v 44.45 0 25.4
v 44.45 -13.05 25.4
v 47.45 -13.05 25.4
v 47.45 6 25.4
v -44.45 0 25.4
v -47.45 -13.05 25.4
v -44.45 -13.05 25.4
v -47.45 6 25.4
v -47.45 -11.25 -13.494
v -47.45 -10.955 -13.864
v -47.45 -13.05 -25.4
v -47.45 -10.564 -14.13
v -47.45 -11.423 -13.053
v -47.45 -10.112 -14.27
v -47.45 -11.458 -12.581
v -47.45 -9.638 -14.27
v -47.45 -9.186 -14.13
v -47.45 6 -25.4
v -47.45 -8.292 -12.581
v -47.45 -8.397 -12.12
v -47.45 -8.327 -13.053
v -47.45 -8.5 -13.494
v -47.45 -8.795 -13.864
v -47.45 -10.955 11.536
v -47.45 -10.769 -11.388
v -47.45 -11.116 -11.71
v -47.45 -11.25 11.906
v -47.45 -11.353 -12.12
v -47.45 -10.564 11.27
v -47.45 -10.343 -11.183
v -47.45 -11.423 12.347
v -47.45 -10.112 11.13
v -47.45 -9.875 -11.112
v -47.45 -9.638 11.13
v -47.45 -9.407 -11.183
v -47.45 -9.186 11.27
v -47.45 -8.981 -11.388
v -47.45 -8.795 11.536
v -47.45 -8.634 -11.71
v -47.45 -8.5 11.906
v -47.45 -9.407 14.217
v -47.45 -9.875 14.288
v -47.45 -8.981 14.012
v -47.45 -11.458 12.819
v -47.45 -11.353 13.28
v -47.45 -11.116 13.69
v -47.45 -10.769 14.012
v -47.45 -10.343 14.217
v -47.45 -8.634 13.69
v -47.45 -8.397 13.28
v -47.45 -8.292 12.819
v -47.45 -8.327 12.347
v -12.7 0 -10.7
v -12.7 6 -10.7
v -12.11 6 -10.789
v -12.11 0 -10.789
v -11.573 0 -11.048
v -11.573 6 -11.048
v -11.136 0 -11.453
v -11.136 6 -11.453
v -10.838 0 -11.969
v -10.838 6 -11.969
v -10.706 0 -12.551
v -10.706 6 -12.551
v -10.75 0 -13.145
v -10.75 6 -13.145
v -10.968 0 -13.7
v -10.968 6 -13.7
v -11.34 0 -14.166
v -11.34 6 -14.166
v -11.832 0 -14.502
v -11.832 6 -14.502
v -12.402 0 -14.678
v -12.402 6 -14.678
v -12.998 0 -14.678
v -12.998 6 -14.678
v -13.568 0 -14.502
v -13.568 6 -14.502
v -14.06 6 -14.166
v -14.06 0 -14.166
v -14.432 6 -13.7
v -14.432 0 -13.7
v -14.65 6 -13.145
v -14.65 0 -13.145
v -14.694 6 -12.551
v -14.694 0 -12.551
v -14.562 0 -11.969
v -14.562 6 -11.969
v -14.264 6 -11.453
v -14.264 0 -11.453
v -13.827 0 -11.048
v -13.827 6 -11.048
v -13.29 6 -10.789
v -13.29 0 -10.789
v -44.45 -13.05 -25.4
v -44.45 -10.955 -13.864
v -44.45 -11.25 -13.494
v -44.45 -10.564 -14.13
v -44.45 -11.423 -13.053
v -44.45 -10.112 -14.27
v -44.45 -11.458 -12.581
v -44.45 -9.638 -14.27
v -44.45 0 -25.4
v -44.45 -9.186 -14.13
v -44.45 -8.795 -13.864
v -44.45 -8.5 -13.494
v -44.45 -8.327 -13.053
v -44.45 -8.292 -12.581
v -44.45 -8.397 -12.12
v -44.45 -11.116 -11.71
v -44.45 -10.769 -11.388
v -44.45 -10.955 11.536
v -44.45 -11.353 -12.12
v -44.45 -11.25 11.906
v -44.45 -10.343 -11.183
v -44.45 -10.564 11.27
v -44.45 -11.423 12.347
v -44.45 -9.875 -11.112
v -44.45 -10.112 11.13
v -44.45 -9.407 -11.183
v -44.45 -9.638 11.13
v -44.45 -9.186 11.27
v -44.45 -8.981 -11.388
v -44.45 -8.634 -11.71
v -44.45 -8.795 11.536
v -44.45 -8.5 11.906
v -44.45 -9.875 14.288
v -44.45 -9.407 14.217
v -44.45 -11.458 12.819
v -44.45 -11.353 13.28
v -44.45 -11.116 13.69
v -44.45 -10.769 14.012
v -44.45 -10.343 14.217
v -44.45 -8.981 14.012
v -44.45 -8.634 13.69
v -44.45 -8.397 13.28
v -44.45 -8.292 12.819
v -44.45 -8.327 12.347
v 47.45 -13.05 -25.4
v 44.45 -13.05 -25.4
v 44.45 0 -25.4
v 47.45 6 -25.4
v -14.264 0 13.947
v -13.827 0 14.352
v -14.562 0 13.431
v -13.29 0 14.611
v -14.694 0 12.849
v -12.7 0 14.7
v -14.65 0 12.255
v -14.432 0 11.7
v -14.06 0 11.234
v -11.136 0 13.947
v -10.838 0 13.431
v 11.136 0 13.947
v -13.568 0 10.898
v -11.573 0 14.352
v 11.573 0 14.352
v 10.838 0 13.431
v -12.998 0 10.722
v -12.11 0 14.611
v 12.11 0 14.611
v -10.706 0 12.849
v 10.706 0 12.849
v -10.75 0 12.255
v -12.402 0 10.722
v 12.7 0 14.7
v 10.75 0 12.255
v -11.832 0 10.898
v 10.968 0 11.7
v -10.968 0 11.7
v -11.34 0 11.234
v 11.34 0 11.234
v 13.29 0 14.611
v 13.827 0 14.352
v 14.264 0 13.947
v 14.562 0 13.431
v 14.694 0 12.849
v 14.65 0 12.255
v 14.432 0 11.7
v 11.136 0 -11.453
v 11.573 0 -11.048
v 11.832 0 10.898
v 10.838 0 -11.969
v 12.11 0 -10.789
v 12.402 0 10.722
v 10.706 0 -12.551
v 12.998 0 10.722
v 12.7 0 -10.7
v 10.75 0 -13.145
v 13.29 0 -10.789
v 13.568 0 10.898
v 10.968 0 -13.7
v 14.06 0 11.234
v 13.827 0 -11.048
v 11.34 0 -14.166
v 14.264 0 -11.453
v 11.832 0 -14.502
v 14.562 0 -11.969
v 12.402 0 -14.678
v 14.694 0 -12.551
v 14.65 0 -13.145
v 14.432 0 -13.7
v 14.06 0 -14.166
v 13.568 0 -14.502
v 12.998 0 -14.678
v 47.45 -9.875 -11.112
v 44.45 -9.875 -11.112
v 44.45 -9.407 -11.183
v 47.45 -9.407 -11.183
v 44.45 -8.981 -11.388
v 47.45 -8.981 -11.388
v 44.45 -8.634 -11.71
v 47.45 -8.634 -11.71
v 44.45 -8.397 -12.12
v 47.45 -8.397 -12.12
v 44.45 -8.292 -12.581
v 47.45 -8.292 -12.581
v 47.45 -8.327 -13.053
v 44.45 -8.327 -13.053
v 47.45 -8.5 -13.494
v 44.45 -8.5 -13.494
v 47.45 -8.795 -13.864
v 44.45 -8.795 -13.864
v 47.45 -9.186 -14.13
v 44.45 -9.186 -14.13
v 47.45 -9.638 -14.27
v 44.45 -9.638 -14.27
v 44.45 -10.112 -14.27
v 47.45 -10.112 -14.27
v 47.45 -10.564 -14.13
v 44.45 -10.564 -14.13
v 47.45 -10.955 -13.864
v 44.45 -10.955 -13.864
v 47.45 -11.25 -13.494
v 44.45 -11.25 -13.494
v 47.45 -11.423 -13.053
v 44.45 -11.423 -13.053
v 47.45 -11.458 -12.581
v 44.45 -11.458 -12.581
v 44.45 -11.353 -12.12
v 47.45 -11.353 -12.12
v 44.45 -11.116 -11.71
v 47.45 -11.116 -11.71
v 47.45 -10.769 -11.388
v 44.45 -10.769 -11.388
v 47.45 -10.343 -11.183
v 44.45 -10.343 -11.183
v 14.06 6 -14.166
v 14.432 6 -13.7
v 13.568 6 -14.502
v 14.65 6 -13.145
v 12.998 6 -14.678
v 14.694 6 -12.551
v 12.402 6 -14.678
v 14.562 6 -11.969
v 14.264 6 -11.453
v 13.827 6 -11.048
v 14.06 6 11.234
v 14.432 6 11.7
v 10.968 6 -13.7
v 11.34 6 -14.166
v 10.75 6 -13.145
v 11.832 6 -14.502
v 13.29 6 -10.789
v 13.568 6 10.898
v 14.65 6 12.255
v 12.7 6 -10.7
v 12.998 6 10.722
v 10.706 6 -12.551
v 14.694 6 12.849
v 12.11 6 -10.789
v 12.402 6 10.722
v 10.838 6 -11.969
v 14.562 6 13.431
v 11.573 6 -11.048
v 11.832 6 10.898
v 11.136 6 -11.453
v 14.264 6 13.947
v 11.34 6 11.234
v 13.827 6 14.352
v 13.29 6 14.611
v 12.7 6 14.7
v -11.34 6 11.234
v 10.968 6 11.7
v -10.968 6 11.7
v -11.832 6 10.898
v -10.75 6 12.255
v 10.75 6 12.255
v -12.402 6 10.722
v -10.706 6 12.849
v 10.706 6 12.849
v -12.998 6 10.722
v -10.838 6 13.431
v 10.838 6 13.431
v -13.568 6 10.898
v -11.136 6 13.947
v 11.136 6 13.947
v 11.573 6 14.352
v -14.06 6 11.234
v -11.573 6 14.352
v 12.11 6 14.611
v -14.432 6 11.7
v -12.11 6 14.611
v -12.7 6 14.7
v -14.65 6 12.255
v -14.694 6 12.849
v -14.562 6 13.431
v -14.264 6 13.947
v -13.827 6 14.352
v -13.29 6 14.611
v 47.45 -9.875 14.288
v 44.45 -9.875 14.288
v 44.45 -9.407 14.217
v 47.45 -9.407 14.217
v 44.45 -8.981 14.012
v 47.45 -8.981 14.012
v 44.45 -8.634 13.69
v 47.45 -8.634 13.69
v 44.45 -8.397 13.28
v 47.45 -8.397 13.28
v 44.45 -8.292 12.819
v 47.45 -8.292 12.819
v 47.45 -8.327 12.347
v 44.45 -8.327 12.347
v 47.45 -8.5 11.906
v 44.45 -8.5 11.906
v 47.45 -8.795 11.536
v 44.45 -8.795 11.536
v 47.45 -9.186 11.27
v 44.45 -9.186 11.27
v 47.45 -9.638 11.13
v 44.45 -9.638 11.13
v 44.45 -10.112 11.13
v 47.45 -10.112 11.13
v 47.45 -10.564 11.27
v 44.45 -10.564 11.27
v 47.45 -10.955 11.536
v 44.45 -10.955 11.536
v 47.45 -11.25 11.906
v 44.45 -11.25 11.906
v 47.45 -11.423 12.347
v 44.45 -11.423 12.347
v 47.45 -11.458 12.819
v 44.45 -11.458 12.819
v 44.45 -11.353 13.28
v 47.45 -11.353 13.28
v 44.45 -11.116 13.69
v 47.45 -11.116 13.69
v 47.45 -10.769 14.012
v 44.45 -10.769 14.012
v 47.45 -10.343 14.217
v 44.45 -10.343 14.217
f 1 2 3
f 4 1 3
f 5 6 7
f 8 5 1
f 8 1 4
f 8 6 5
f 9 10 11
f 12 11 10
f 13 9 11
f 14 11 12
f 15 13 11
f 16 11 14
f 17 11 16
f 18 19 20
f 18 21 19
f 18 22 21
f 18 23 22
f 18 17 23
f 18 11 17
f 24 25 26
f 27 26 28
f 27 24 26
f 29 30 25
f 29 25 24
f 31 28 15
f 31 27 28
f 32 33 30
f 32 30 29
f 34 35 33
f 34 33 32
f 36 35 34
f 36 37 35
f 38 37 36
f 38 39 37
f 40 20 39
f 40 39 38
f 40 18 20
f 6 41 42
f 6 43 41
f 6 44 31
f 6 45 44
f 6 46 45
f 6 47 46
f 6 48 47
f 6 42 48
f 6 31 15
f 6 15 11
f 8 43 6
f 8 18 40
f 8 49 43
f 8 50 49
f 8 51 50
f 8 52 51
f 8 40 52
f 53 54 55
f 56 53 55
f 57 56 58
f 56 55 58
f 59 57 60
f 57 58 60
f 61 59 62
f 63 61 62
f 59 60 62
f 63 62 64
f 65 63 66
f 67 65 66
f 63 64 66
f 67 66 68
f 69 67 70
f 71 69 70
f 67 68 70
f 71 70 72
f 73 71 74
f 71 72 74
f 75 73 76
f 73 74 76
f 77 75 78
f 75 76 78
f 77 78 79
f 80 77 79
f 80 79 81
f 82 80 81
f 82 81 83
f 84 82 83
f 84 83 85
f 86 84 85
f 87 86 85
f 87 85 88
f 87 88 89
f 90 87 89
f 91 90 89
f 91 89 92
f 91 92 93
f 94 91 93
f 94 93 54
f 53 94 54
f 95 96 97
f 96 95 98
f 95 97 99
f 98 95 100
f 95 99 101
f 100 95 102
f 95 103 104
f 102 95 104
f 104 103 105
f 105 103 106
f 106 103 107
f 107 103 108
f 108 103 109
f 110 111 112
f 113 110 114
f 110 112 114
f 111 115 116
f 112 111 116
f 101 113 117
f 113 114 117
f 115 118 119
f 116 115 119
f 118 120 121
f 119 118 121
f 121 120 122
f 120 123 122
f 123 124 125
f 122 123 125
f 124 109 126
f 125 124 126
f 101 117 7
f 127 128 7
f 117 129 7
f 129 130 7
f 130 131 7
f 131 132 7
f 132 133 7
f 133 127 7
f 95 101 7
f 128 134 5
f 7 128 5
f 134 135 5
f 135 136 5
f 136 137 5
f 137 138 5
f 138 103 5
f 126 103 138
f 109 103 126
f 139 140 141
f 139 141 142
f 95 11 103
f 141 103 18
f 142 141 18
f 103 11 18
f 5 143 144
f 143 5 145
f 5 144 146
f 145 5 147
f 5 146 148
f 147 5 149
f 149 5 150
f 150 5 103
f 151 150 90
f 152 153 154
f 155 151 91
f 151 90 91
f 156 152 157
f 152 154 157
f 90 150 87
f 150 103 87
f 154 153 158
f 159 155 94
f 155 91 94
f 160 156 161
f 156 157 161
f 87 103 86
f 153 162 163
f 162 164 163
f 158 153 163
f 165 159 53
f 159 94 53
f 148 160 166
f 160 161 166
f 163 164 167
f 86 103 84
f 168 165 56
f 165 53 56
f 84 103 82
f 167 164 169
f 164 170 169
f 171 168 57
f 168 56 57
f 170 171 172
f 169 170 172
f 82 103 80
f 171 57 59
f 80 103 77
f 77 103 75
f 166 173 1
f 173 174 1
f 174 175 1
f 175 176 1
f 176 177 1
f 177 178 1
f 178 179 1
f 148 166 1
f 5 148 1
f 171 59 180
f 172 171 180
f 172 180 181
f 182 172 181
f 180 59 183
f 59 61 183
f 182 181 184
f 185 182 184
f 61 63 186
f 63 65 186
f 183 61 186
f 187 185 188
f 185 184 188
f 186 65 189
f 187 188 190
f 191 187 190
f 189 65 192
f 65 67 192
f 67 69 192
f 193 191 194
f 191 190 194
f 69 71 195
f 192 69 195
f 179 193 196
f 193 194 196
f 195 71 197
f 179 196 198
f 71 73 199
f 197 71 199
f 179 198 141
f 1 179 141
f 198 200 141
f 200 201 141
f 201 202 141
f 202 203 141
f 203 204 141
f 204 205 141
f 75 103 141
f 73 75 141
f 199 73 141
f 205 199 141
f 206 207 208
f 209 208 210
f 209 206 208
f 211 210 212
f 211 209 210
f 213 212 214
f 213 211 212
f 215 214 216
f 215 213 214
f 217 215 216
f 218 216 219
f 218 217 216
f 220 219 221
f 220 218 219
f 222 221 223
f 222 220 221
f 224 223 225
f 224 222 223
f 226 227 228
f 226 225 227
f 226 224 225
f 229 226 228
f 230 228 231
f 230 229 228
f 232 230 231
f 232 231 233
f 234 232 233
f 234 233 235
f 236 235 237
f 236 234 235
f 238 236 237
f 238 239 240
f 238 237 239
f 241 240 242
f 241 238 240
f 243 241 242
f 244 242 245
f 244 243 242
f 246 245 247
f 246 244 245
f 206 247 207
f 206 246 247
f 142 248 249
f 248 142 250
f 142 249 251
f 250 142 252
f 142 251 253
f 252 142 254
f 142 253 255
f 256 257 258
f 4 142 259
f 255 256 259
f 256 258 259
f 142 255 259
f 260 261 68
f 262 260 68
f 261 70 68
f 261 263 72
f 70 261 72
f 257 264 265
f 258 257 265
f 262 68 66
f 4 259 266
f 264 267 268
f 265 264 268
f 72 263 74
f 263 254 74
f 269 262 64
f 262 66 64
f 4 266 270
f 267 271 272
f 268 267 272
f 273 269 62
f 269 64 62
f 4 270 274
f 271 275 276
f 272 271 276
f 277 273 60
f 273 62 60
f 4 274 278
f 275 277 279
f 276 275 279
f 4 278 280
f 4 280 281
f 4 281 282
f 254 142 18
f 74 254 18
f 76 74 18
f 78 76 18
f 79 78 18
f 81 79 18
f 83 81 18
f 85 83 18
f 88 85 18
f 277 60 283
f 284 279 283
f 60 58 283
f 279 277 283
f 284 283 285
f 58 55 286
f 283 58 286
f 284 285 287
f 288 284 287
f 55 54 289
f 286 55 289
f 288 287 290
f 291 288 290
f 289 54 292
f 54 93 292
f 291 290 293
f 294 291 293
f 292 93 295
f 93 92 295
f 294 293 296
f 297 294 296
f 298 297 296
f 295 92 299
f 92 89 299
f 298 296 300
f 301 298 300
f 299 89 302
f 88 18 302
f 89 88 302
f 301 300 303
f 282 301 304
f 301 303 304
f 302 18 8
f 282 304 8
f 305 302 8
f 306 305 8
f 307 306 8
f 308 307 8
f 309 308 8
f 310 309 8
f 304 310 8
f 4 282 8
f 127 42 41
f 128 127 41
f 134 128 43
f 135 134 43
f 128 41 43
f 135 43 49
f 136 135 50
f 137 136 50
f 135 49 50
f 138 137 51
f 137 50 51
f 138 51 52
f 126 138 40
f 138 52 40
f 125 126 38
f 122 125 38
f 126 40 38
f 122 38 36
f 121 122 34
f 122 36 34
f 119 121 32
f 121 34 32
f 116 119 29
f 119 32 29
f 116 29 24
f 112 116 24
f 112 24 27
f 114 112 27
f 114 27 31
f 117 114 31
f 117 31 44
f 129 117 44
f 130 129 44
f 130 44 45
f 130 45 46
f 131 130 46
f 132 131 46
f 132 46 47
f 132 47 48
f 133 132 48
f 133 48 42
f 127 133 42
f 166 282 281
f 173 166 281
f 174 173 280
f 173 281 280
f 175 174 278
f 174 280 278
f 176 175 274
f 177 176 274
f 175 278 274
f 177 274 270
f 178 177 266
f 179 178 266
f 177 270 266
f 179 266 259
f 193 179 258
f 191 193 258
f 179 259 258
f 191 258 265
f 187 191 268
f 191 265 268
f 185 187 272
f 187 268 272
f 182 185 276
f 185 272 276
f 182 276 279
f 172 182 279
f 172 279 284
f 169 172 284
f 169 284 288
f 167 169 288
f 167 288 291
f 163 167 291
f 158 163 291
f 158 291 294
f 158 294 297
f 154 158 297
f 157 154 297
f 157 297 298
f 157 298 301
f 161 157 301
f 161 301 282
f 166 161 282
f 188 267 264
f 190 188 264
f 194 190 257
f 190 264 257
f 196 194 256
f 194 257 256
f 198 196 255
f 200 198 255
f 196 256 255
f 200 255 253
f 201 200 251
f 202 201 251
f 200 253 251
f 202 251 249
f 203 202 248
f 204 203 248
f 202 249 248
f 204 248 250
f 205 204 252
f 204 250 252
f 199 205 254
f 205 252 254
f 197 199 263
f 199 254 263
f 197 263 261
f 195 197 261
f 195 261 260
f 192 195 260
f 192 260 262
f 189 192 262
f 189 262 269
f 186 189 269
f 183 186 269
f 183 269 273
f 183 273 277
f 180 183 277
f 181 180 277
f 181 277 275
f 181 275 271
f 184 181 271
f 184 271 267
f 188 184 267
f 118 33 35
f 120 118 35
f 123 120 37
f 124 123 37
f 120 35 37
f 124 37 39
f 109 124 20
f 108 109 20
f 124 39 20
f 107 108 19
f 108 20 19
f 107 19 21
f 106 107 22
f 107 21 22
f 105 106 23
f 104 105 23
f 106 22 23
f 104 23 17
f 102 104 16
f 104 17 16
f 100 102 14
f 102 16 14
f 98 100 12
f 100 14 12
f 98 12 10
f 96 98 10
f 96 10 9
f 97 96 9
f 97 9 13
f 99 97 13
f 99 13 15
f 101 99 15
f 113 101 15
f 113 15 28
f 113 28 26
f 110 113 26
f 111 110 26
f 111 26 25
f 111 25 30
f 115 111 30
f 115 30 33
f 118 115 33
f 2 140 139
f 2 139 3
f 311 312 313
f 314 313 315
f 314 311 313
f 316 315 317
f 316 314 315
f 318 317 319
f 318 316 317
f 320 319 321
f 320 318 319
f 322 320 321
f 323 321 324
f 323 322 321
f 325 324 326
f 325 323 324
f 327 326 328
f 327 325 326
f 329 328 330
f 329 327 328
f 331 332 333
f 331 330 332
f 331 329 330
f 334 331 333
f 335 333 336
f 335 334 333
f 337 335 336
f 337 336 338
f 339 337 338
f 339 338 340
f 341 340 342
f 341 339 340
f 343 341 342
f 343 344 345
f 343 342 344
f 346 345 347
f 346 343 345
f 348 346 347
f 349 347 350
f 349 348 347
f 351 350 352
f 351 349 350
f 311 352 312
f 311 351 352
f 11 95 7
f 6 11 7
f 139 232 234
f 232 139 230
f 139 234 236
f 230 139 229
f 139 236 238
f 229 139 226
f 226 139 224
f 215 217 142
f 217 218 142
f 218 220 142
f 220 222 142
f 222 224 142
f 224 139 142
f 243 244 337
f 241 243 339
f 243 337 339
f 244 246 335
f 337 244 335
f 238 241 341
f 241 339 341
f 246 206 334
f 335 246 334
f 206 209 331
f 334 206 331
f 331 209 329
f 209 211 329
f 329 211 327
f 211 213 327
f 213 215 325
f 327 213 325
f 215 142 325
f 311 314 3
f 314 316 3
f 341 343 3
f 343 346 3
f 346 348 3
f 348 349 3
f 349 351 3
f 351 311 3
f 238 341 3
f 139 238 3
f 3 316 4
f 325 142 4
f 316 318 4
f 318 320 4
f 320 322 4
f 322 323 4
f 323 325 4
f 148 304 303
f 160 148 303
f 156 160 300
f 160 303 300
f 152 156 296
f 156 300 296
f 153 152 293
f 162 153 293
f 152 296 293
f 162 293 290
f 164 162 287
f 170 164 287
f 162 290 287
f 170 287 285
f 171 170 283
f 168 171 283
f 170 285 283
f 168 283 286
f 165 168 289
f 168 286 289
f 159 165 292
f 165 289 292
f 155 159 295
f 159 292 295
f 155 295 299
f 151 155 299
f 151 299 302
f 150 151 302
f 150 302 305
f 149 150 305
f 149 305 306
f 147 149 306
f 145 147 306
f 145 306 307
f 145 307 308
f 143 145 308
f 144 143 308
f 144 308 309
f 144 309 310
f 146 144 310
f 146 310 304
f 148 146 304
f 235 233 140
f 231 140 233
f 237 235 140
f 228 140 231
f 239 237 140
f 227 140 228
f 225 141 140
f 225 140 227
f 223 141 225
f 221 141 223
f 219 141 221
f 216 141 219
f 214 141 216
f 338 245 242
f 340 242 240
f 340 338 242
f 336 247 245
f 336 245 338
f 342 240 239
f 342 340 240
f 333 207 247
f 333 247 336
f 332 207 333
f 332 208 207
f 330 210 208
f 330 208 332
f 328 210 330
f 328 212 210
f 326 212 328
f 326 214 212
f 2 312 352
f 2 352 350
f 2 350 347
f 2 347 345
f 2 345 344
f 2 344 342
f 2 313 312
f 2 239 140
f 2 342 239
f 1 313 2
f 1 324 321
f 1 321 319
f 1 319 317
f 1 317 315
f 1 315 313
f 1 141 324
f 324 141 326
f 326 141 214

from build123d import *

# Parameters (mm, degrees)
SKETCH1_W           = 88.9
SKETCH1_H           = 50.8
BOSS_EXTRUDE1_DEPTH = 6
SKETCH2_W           = 50.8
SKETCH2_H           = 19.05
BOSS_EXTRUDE2_DEPTH = 3
SKETCH3_R           = 1.5875
CUT_EXTRUDE1_DEPTH  = 97.234466279
SKETCH4_R           = 2
CUT_EXTRUDE2_DEPTH  = 58.092600221


with BuildPart() as part:
    # Sketch1 → Boss-Extrude1 (new body)
    with BuildSketch(Plane(origin=(0, 0, 0), x_dir=(1, 0, 0), z_dir=(0, 1, 0))):
        Rectangle(SKETCH1_W, SKETCH1_H)
    extrude(amount=BOSS_EXTRUDE1_DEPTH)

    # Sketch2 → Boss-Extrude2 (add)
    with BuildSketch(Plane.ZY.offset(44.45)):
        with Locations((0, -3.525)):
            Rectangle(SKETCH2_W, SKETCH2_H)
    boss_extrude2 = extrude(amount=BOSS_EXTRUDE2_DEPTH)

    # Sketch3 → Cut-Extrude1 (cut, through all)
    with BuildSketch(Plane.ZY.offset(47.45)):
        with Locations((-12.7, -9.875)):
            Circle(SKETCH3_R)
        with Locations((12.7, -9.875)):
            Circle(SKETCH3_R)
    cut_extrude1 = extrude(amount=-CUT_EXTRUDE1_DEPTH, mode=Mode.SUBTRACT)

    # Mirror1: Boss-Extrude2, Cut-Extrude1 across plane
    add(boss_extrude2.mirror(Plane(origin=(0, 0, 0), x_dir=(0, 0, 1), z_dir=(1, 0, 0))))
    add(cut_extrude1.mirror(Plane(origin=(0, 0, 0), x_dir=(0, 0, 1), z_dir=(1, 0, 0))), mode=Mode.SUBTRACT)

    # Sketch4 → Cut-Extrude2 (cut, through all)
    with BuildSketch(Plane(origin=(0, 6, 0), x_dir=(1, 0, 0), z_dir=(0, 1, 0))):
        with Locations(Location((-12.7, 12.7, 0), (0, 0, 270))):
            Circle(SKETCH4_R)
        with Locations(Location((12.7, 12.7, 0), (0, 0, 270))):
            Circle(SKETCH4_R)
        with Locations(Location((-12.7, -12.7, 0), (0, 0, 270))):
            Circle(SKETCH4_R)
        with Locations(Location((12.7, -12.7, 0), (0, 0, 270))):
            Circle(SKETCH4_R)
    extrude(amount=-CUT_EXTRUDE2_DEPTH, mode=Mode.SUBTRACT)


solid = part.part
